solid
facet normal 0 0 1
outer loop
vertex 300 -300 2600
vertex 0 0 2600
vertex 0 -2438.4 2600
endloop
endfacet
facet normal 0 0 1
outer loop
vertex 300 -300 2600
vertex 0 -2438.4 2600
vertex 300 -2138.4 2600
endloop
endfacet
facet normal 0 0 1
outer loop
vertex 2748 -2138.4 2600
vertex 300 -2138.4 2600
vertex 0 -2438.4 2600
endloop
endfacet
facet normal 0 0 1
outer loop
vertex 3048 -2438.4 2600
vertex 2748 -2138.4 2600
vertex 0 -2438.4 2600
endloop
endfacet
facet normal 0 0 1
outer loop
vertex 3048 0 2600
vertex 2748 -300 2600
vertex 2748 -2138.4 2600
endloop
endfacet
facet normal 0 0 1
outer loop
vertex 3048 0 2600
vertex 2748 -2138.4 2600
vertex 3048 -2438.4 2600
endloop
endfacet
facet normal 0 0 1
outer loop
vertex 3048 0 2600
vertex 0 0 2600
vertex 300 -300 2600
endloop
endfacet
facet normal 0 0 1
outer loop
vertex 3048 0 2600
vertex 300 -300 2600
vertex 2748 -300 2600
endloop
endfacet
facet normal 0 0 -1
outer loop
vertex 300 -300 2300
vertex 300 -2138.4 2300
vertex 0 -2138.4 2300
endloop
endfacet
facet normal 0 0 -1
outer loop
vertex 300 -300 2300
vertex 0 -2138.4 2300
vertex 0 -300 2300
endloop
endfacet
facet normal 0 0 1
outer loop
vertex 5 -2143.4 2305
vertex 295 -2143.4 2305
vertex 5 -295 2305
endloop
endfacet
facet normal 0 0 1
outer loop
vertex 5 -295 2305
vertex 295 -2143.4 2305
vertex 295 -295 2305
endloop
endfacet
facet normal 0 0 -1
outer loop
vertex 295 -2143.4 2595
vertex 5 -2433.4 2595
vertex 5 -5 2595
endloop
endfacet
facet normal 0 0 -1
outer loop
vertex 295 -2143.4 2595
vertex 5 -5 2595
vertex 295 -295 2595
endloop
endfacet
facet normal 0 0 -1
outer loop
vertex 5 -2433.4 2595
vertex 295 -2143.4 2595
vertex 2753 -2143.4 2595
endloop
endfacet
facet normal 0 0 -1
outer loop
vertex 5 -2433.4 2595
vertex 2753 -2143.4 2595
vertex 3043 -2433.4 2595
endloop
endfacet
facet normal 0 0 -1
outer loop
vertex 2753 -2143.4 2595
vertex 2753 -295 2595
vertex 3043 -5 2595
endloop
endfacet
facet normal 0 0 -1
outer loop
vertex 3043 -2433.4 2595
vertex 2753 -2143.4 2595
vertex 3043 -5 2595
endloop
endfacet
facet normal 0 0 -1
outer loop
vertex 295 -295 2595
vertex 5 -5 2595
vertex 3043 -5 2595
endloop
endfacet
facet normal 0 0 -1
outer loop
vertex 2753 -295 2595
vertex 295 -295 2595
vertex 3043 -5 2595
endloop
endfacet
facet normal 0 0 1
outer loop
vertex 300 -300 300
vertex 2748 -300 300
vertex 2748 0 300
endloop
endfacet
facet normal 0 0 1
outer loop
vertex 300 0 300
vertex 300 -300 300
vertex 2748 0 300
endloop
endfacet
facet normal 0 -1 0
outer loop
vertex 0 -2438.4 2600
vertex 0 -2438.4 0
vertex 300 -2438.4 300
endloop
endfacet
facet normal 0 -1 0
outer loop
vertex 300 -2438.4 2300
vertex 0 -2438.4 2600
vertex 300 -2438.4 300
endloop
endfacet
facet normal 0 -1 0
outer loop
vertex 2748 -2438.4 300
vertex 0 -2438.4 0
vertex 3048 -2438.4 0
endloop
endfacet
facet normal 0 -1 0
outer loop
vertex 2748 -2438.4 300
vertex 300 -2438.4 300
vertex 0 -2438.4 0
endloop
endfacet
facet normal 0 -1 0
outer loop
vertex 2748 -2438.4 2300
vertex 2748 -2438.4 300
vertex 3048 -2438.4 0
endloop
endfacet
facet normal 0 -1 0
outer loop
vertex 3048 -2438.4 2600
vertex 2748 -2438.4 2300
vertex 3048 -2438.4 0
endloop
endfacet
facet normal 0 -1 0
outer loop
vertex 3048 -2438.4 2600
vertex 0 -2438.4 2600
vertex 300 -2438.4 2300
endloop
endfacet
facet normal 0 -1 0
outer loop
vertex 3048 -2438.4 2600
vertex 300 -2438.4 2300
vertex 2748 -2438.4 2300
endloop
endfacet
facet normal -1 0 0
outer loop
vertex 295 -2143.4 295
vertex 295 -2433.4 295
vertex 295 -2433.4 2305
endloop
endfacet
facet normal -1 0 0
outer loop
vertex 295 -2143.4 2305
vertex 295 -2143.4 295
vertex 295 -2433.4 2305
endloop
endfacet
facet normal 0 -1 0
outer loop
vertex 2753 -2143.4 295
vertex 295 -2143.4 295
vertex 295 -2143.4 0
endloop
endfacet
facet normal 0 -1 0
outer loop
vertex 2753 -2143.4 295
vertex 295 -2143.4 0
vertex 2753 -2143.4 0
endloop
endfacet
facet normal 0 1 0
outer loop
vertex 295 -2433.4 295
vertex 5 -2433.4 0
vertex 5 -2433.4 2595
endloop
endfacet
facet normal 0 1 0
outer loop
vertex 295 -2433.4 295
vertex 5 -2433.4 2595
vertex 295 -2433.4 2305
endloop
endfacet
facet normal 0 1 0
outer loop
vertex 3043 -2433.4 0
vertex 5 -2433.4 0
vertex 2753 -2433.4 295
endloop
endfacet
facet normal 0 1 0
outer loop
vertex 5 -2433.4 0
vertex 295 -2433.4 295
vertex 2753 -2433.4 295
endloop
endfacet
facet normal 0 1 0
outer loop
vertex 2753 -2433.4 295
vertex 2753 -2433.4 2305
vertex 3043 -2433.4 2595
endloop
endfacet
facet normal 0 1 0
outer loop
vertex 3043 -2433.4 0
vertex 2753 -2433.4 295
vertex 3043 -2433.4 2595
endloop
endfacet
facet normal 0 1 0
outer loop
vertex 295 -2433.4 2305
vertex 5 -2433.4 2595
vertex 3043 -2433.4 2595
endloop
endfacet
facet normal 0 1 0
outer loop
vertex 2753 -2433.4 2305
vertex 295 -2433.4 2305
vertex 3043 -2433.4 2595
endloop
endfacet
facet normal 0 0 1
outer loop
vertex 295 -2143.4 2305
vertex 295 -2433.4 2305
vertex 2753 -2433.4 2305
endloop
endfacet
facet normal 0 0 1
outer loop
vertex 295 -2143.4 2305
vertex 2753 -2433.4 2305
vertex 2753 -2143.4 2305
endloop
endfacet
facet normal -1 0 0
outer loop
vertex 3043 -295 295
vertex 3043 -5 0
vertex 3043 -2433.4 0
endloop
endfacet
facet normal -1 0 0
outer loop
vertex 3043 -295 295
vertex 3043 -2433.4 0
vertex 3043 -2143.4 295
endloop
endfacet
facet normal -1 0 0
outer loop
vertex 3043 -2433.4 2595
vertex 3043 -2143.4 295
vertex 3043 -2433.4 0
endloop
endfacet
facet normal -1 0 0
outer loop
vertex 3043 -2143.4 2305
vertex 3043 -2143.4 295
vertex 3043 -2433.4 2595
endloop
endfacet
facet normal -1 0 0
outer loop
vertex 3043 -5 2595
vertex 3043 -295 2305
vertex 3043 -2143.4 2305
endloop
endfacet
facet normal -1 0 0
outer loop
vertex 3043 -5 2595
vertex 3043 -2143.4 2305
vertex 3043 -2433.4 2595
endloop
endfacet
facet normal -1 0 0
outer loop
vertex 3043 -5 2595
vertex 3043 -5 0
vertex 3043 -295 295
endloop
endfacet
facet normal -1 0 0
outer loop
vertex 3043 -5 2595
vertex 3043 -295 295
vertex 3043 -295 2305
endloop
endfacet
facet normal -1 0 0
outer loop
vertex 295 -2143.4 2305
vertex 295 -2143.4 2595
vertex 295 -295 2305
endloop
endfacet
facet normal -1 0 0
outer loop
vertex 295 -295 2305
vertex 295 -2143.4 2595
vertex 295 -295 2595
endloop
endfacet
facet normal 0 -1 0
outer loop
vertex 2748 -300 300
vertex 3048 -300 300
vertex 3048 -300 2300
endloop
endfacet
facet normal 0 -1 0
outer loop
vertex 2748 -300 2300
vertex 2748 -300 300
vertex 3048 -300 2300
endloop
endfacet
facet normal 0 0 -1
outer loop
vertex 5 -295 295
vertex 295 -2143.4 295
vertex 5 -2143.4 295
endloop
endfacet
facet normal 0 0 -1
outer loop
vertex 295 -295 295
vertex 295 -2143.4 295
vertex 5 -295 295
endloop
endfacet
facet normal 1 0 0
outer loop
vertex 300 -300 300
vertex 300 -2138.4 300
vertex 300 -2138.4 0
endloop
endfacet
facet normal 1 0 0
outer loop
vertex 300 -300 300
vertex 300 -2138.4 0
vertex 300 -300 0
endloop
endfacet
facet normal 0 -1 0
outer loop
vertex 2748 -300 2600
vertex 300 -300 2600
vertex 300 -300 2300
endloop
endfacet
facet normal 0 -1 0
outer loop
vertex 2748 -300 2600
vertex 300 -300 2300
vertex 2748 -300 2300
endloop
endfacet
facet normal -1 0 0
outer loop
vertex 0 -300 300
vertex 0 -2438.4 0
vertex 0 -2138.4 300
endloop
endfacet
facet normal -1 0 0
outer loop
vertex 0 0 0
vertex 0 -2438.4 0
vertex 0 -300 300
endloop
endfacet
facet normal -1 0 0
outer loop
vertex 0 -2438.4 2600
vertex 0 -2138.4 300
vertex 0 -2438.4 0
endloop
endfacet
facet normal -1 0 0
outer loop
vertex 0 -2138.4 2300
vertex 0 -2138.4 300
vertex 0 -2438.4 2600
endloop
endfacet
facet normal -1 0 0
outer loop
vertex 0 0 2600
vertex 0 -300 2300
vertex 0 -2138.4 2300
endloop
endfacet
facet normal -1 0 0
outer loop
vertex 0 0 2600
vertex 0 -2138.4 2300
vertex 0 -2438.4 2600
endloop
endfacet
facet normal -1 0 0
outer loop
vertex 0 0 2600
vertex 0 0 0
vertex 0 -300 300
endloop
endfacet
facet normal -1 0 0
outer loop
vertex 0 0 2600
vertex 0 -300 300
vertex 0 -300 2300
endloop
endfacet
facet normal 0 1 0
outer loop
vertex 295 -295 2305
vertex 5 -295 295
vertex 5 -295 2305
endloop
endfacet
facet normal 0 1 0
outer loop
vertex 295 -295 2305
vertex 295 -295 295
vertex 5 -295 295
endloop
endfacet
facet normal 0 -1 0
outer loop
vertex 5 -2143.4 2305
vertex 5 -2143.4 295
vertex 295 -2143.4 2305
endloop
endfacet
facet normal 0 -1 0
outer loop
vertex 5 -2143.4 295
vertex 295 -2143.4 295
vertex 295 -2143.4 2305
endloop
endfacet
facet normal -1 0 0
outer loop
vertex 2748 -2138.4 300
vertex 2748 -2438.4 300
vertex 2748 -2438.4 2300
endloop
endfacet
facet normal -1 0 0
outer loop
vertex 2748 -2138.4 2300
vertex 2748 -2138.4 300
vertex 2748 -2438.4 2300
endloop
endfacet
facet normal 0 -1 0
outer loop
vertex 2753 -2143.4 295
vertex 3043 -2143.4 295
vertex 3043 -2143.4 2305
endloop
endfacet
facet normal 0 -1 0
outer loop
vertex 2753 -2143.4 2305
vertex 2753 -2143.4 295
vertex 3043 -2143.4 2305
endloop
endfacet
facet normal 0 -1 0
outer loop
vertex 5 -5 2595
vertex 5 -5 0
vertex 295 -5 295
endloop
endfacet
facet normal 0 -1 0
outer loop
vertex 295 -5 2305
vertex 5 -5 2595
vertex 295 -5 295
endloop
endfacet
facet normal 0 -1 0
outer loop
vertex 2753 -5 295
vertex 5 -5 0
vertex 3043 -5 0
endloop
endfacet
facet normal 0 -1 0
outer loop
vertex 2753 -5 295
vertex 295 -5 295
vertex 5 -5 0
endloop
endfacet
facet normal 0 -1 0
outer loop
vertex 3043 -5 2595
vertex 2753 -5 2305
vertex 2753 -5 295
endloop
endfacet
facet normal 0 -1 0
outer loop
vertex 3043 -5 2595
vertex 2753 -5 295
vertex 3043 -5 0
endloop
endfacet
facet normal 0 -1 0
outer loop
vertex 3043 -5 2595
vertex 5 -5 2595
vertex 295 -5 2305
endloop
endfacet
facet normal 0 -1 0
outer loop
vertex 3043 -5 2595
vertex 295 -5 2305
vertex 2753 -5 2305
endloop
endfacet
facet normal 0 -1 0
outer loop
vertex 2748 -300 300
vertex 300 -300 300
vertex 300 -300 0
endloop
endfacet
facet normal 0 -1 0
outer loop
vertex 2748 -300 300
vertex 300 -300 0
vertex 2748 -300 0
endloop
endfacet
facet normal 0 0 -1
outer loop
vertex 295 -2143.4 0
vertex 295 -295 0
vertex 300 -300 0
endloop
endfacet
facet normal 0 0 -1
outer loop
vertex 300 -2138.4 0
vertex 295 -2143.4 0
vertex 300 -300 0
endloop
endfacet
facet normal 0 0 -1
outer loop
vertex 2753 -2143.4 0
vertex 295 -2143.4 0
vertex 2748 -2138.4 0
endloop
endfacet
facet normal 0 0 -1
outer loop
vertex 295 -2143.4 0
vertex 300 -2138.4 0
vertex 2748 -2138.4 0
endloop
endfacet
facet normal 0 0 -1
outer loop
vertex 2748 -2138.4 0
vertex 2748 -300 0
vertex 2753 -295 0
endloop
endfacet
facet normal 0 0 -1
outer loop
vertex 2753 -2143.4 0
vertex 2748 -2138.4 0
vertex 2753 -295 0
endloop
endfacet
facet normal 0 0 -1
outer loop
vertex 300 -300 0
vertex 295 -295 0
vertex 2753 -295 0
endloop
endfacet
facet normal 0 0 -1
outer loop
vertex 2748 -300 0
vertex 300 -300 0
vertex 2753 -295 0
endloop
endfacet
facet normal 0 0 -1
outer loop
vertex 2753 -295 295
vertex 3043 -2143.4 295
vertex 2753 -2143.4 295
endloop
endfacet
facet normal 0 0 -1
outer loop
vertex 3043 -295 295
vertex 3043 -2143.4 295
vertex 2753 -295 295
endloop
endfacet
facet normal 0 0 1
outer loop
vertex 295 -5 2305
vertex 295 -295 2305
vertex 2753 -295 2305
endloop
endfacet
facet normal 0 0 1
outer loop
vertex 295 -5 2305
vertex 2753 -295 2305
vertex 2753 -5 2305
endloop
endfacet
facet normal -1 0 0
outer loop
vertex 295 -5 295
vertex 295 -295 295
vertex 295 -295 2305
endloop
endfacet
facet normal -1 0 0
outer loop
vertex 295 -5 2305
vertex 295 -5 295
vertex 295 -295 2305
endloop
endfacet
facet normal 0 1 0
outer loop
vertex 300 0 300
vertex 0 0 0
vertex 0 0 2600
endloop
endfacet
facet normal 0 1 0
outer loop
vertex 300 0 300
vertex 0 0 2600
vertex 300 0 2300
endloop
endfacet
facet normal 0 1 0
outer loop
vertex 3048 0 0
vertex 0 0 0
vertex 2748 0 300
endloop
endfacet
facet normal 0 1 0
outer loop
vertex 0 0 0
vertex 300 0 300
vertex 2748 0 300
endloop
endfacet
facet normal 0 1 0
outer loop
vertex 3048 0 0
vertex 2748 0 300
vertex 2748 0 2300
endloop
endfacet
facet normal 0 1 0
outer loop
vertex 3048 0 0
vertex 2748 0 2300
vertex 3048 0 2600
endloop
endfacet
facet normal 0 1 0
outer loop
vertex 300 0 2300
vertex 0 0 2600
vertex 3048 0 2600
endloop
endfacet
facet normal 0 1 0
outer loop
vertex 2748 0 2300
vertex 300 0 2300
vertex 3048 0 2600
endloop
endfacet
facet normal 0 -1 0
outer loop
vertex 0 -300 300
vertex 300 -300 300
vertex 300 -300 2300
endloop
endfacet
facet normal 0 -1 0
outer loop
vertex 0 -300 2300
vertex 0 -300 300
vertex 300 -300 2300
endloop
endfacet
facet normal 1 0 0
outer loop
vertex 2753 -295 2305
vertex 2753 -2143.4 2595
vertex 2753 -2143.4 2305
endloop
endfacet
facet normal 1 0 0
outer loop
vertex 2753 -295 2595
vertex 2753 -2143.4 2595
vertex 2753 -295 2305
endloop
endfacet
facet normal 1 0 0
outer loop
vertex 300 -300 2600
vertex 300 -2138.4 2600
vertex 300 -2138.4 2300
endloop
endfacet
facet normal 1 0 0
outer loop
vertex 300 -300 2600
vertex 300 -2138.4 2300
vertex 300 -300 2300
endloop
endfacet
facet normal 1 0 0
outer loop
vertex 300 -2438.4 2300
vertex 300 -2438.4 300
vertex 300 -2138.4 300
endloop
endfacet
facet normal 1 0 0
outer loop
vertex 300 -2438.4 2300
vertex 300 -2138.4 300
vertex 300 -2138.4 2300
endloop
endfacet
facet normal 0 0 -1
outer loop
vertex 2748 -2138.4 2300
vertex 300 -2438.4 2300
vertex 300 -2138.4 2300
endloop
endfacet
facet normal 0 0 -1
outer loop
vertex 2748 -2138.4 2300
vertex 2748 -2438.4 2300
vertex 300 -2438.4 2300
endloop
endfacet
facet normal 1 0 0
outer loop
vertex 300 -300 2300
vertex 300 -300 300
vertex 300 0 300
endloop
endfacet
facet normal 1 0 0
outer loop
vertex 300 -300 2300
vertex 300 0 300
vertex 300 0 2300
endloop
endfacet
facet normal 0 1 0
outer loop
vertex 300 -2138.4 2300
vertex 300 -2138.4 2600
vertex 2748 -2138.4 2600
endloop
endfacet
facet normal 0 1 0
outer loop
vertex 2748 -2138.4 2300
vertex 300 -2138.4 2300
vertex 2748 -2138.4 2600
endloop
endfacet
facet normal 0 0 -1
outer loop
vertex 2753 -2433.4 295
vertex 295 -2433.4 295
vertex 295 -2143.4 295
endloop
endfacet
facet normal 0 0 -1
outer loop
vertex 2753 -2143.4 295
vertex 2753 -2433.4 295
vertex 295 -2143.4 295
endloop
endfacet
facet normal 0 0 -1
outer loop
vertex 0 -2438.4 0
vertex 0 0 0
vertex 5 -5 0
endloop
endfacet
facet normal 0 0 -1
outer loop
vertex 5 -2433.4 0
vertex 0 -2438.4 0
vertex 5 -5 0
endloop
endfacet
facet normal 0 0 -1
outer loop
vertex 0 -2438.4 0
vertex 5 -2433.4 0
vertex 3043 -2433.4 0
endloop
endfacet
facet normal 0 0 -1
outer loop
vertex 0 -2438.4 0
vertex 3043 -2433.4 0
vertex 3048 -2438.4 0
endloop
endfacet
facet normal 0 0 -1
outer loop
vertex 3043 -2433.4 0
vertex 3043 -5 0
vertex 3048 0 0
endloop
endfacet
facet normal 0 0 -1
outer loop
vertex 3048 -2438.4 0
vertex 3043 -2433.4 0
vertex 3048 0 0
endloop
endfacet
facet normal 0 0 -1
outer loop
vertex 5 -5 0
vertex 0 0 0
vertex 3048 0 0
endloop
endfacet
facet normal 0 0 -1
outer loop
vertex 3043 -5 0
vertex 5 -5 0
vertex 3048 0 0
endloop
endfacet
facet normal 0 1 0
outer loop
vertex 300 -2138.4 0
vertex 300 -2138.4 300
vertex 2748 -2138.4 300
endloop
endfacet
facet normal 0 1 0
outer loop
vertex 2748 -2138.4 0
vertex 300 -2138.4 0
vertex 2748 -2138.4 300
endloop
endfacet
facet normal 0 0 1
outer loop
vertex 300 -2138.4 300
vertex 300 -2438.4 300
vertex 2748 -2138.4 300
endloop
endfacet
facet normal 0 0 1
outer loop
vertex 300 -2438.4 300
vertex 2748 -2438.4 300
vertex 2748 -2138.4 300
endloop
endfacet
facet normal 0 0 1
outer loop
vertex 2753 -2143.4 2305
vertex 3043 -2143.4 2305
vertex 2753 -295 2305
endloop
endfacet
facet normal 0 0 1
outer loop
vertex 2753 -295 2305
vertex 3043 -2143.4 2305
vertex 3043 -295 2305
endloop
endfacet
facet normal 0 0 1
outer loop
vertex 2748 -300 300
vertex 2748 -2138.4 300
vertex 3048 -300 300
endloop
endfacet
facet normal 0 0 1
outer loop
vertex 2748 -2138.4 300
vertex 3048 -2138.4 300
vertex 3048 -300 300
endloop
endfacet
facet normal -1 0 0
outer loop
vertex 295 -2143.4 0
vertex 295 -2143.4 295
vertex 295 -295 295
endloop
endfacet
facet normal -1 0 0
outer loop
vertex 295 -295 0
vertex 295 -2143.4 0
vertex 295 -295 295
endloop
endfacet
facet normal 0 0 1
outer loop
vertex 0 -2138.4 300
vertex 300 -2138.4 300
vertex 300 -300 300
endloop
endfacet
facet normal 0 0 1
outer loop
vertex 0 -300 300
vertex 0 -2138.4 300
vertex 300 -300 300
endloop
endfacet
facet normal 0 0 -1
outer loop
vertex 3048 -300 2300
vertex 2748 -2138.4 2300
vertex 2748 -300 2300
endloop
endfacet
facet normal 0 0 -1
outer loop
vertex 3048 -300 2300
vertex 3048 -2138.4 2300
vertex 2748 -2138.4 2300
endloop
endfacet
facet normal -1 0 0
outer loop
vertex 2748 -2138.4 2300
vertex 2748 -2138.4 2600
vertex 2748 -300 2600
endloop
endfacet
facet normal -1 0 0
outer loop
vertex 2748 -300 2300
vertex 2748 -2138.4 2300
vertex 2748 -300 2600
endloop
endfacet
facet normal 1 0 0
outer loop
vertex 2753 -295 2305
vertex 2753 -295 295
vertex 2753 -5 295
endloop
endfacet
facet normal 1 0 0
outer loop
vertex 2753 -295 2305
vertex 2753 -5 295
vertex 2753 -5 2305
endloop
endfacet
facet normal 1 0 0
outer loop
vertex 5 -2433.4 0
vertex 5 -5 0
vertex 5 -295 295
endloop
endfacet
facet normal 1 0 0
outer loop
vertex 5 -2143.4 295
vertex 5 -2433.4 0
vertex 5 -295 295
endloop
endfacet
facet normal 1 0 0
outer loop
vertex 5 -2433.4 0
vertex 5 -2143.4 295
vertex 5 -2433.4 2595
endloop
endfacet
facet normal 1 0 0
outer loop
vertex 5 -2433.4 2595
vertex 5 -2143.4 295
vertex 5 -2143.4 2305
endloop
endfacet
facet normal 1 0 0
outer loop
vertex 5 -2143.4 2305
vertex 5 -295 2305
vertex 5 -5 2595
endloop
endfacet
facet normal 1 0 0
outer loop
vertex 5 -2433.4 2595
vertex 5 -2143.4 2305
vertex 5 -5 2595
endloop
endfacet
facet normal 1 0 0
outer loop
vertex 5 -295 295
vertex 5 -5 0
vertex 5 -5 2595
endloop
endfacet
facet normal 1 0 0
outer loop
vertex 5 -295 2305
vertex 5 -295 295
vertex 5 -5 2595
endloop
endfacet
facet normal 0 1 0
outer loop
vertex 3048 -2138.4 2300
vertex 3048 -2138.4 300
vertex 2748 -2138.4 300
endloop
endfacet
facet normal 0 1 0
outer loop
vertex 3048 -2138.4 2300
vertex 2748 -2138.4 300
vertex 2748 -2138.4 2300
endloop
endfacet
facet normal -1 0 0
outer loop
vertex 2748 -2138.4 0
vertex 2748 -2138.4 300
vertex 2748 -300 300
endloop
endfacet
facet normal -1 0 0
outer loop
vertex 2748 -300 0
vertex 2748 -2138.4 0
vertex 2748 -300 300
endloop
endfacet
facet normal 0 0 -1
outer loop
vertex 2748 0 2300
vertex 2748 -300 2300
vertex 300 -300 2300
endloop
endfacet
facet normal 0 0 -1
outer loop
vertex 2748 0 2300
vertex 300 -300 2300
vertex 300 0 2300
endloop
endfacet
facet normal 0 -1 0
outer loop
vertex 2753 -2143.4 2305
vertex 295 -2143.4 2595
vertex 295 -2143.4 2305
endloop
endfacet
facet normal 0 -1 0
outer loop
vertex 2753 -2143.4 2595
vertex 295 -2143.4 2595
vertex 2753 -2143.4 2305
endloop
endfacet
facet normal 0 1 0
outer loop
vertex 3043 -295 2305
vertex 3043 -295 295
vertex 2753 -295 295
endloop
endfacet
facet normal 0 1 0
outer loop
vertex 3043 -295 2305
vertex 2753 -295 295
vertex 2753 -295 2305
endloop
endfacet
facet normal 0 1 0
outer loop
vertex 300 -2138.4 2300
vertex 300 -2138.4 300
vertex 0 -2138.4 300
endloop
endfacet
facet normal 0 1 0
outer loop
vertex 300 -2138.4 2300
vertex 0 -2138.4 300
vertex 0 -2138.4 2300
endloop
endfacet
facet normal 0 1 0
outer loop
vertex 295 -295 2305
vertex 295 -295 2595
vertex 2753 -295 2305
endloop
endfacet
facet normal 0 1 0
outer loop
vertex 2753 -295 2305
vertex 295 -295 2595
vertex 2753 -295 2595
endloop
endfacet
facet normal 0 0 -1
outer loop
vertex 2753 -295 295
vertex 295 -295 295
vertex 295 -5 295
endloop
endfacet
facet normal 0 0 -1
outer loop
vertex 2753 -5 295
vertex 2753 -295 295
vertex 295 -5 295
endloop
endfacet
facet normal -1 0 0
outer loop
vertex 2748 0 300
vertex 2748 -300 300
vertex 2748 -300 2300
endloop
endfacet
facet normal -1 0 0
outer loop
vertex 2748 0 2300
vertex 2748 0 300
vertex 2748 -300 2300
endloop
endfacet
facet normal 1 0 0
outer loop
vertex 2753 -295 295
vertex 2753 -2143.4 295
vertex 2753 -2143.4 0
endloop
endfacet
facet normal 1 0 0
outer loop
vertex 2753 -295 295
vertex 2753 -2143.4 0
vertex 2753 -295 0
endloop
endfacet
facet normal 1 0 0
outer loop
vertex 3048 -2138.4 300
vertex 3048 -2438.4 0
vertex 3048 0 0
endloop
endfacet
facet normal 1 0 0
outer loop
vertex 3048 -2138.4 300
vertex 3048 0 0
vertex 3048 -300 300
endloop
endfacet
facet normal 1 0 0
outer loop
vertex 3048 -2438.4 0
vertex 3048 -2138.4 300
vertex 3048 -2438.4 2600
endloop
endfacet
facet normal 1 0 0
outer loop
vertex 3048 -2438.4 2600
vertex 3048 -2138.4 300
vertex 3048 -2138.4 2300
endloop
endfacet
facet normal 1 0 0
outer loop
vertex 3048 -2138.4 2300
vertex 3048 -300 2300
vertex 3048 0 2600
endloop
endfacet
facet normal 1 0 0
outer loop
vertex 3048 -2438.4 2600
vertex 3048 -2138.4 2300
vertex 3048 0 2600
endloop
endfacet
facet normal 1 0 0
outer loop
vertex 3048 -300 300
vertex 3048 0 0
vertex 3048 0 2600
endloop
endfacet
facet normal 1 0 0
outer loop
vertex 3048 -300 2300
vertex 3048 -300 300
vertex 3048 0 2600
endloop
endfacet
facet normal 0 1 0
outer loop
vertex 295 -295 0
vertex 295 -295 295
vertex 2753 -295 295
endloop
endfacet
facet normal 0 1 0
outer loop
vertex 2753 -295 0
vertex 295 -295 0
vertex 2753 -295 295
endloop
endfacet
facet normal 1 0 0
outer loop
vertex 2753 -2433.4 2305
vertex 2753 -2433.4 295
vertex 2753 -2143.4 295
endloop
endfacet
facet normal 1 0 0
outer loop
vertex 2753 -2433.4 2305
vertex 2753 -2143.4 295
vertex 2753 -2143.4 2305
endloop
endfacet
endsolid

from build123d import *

# Parameters (mm, degrees)
F0_W     = 3048
F0_H     = 2600
F1_DEPTH = 2438.4
F2_W     = 2448
F2_H     = 2000
F3_DEPTH = 3920
F4_W     = 1838.4
F4_H     = 2000
F5_DEPTH = 4630
F6_W     = 2448
F6_H     = 1838.4
F7_DEPTH = 3030
F8_T     = -5


with BuildPart() as f1:
    # F0 (on Front) → F1 (new body)
    with BuildSketch(Plane.XZ):
        with Locations((1524, 1300)):
            Rectangle(F0_W, F0_H)
    extrude(amount=F1_DEPTH)

    # F2 (on face) → F3 (cut)
    with BuildSketch(Plane.XZ.offset(2438.4)):
        with Locations((1524, 1300)):
            Rectangle(F2_W, F2_H)
    extrude(amount=-F3_DEPTH, mode=Mode.SUBTRACT)

    # F4 (on face) → F5 (cut)
    with BuildSketch(Plane.YZ.offset(3048)):
        with Locations((-1219.2, 1300)):
            Rectangle(F4_W, F4_H)
    extrude(amount=-F5_DEPTH, mode=Mode.SUBTRACT)

    # F6 (on face) → F7 (cut)
    with BuildSketch(Plane.XY.offset(2600)):
        with Locations((1524, -1219.2)):
            Rectangle(F6_W, F6_H)
    extrude(amount=-F7_DEPTH, mode=Mode.SUBTRACT)

    # F8
    f8_openings = [f1.faces().sort_by_distance(p)[0] for p in [
        (39.033445, -1219.2, 0),
    ]]
    offset(amount=F8_T, openings=f8_openings, kind=Kind.INTERSECTION)


solid = f1.part
